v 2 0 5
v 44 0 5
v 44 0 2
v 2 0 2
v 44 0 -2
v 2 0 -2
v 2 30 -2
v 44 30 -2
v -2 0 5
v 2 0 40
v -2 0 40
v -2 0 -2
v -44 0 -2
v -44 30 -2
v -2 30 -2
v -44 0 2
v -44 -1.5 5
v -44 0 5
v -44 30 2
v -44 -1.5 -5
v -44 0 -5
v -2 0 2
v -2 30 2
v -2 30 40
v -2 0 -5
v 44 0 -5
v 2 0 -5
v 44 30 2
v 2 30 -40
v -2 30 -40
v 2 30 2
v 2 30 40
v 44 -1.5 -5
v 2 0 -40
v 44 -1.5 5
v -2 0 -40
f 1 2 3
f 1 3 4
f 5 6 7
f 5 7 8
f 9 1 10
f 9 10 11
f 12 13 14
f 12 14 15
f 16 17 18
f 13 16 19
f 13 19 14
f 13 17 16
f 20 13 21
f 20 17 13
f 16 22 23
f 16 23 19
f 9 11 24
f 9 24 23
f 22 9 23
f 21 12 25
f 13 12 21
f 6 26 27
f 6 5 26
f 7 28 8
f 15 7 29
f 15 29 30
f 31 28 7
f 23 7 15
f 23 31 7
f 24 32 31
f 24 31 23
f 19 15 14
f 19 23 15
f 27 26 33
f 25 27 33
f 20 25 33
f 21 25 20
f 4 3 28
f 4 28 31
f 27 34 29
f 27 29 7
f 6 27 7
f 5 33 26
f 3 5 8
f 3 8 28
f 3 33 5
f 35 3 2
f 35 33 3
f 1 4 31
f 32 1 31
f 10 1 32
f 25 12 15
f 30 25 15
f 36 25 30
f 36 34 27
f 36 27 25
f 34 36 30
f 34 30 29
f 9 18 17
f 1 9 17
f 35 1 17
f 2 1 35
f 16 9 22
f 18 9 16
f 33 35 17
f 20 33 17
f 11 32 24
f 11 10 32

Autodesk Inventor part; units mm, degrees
ref_plane "YZ Plane" through (0, 0, 0) normal (1, 0, 0) x (0, 1, 0)
ref_plane "XZ Plane" through (0, 0, 0) normal (0, 1, 0) x (-1, 0, 0)
ref_plane "XY Plane" through (0, 0, 0) normal (0, 0, 1) x (1, 0, 0)
sketch "Sketch2" plane through (0, 0, 0) normal (0, 1, 0) x (-1, 0, 0)
  line L0 (2, -40) -> (-2, -40)
  line L1 (-2, -40) -> (-2, 40)
  line L2 (-2, 40) -> (2, 40)
  line L3 (2, 40) -> (2, -40)
  line L4 (44, -2) -> (-44, -2)
  line L5 (-44, -2) -> (-44, 2)
  line L6 (-44, 2) -> (44, 2)
  line L7 (44, 2) -> (44, -2)
  line L8 (44, 5) -> (-44, 5)
  line L9 (-44, 5) -> (-44, -5)
  line L10 (-44, -5) -> (44, -5)
  line L11 (44, -5) -> (44, 5)
  point P0 (0, 0)
  point P1 (0, -40)
  point P2 (-44, 0)
  point P3 (0, -2)
  point P4 (-2, 0)
  point P5 (2, 2)
  point P6 (-2, 2)
  point P7 (-2, -2)
  point P8 (2, -2)
  point P9 (44, 0)
  dimension "d0" = 4
  dimension "d1" = 4
  dimension "d2" = 80
  dimension "d3" = 88
  dimension "d6" = 10
extrude "Extrusion1" add sketch "Sketch2" along normal blind 30 contours L0 L1 L10 L3 | L10 L1 L4 L3 | L4 L1 L6 L3 | L3 L6 L7 L4 | L4 L5 L6 L1 | L6 L1 L8 L3 | L8 L1 L2 L3
extrude "Extrusion2" add sketch "Sketch2" against normal blind 1.5 contours L10 L1 L4 L3 | L3 L4 L11 L10 | L10 L9 L4 L1 | L4 L1 L6 L3 | L3 L6 L7 L4 | L4 L5 L6 L1 | L6 L1 L8 L3 | L3 L8 L11 L6 | L6 L9 L8 L1
properties part number "halfdrawerdivider"
